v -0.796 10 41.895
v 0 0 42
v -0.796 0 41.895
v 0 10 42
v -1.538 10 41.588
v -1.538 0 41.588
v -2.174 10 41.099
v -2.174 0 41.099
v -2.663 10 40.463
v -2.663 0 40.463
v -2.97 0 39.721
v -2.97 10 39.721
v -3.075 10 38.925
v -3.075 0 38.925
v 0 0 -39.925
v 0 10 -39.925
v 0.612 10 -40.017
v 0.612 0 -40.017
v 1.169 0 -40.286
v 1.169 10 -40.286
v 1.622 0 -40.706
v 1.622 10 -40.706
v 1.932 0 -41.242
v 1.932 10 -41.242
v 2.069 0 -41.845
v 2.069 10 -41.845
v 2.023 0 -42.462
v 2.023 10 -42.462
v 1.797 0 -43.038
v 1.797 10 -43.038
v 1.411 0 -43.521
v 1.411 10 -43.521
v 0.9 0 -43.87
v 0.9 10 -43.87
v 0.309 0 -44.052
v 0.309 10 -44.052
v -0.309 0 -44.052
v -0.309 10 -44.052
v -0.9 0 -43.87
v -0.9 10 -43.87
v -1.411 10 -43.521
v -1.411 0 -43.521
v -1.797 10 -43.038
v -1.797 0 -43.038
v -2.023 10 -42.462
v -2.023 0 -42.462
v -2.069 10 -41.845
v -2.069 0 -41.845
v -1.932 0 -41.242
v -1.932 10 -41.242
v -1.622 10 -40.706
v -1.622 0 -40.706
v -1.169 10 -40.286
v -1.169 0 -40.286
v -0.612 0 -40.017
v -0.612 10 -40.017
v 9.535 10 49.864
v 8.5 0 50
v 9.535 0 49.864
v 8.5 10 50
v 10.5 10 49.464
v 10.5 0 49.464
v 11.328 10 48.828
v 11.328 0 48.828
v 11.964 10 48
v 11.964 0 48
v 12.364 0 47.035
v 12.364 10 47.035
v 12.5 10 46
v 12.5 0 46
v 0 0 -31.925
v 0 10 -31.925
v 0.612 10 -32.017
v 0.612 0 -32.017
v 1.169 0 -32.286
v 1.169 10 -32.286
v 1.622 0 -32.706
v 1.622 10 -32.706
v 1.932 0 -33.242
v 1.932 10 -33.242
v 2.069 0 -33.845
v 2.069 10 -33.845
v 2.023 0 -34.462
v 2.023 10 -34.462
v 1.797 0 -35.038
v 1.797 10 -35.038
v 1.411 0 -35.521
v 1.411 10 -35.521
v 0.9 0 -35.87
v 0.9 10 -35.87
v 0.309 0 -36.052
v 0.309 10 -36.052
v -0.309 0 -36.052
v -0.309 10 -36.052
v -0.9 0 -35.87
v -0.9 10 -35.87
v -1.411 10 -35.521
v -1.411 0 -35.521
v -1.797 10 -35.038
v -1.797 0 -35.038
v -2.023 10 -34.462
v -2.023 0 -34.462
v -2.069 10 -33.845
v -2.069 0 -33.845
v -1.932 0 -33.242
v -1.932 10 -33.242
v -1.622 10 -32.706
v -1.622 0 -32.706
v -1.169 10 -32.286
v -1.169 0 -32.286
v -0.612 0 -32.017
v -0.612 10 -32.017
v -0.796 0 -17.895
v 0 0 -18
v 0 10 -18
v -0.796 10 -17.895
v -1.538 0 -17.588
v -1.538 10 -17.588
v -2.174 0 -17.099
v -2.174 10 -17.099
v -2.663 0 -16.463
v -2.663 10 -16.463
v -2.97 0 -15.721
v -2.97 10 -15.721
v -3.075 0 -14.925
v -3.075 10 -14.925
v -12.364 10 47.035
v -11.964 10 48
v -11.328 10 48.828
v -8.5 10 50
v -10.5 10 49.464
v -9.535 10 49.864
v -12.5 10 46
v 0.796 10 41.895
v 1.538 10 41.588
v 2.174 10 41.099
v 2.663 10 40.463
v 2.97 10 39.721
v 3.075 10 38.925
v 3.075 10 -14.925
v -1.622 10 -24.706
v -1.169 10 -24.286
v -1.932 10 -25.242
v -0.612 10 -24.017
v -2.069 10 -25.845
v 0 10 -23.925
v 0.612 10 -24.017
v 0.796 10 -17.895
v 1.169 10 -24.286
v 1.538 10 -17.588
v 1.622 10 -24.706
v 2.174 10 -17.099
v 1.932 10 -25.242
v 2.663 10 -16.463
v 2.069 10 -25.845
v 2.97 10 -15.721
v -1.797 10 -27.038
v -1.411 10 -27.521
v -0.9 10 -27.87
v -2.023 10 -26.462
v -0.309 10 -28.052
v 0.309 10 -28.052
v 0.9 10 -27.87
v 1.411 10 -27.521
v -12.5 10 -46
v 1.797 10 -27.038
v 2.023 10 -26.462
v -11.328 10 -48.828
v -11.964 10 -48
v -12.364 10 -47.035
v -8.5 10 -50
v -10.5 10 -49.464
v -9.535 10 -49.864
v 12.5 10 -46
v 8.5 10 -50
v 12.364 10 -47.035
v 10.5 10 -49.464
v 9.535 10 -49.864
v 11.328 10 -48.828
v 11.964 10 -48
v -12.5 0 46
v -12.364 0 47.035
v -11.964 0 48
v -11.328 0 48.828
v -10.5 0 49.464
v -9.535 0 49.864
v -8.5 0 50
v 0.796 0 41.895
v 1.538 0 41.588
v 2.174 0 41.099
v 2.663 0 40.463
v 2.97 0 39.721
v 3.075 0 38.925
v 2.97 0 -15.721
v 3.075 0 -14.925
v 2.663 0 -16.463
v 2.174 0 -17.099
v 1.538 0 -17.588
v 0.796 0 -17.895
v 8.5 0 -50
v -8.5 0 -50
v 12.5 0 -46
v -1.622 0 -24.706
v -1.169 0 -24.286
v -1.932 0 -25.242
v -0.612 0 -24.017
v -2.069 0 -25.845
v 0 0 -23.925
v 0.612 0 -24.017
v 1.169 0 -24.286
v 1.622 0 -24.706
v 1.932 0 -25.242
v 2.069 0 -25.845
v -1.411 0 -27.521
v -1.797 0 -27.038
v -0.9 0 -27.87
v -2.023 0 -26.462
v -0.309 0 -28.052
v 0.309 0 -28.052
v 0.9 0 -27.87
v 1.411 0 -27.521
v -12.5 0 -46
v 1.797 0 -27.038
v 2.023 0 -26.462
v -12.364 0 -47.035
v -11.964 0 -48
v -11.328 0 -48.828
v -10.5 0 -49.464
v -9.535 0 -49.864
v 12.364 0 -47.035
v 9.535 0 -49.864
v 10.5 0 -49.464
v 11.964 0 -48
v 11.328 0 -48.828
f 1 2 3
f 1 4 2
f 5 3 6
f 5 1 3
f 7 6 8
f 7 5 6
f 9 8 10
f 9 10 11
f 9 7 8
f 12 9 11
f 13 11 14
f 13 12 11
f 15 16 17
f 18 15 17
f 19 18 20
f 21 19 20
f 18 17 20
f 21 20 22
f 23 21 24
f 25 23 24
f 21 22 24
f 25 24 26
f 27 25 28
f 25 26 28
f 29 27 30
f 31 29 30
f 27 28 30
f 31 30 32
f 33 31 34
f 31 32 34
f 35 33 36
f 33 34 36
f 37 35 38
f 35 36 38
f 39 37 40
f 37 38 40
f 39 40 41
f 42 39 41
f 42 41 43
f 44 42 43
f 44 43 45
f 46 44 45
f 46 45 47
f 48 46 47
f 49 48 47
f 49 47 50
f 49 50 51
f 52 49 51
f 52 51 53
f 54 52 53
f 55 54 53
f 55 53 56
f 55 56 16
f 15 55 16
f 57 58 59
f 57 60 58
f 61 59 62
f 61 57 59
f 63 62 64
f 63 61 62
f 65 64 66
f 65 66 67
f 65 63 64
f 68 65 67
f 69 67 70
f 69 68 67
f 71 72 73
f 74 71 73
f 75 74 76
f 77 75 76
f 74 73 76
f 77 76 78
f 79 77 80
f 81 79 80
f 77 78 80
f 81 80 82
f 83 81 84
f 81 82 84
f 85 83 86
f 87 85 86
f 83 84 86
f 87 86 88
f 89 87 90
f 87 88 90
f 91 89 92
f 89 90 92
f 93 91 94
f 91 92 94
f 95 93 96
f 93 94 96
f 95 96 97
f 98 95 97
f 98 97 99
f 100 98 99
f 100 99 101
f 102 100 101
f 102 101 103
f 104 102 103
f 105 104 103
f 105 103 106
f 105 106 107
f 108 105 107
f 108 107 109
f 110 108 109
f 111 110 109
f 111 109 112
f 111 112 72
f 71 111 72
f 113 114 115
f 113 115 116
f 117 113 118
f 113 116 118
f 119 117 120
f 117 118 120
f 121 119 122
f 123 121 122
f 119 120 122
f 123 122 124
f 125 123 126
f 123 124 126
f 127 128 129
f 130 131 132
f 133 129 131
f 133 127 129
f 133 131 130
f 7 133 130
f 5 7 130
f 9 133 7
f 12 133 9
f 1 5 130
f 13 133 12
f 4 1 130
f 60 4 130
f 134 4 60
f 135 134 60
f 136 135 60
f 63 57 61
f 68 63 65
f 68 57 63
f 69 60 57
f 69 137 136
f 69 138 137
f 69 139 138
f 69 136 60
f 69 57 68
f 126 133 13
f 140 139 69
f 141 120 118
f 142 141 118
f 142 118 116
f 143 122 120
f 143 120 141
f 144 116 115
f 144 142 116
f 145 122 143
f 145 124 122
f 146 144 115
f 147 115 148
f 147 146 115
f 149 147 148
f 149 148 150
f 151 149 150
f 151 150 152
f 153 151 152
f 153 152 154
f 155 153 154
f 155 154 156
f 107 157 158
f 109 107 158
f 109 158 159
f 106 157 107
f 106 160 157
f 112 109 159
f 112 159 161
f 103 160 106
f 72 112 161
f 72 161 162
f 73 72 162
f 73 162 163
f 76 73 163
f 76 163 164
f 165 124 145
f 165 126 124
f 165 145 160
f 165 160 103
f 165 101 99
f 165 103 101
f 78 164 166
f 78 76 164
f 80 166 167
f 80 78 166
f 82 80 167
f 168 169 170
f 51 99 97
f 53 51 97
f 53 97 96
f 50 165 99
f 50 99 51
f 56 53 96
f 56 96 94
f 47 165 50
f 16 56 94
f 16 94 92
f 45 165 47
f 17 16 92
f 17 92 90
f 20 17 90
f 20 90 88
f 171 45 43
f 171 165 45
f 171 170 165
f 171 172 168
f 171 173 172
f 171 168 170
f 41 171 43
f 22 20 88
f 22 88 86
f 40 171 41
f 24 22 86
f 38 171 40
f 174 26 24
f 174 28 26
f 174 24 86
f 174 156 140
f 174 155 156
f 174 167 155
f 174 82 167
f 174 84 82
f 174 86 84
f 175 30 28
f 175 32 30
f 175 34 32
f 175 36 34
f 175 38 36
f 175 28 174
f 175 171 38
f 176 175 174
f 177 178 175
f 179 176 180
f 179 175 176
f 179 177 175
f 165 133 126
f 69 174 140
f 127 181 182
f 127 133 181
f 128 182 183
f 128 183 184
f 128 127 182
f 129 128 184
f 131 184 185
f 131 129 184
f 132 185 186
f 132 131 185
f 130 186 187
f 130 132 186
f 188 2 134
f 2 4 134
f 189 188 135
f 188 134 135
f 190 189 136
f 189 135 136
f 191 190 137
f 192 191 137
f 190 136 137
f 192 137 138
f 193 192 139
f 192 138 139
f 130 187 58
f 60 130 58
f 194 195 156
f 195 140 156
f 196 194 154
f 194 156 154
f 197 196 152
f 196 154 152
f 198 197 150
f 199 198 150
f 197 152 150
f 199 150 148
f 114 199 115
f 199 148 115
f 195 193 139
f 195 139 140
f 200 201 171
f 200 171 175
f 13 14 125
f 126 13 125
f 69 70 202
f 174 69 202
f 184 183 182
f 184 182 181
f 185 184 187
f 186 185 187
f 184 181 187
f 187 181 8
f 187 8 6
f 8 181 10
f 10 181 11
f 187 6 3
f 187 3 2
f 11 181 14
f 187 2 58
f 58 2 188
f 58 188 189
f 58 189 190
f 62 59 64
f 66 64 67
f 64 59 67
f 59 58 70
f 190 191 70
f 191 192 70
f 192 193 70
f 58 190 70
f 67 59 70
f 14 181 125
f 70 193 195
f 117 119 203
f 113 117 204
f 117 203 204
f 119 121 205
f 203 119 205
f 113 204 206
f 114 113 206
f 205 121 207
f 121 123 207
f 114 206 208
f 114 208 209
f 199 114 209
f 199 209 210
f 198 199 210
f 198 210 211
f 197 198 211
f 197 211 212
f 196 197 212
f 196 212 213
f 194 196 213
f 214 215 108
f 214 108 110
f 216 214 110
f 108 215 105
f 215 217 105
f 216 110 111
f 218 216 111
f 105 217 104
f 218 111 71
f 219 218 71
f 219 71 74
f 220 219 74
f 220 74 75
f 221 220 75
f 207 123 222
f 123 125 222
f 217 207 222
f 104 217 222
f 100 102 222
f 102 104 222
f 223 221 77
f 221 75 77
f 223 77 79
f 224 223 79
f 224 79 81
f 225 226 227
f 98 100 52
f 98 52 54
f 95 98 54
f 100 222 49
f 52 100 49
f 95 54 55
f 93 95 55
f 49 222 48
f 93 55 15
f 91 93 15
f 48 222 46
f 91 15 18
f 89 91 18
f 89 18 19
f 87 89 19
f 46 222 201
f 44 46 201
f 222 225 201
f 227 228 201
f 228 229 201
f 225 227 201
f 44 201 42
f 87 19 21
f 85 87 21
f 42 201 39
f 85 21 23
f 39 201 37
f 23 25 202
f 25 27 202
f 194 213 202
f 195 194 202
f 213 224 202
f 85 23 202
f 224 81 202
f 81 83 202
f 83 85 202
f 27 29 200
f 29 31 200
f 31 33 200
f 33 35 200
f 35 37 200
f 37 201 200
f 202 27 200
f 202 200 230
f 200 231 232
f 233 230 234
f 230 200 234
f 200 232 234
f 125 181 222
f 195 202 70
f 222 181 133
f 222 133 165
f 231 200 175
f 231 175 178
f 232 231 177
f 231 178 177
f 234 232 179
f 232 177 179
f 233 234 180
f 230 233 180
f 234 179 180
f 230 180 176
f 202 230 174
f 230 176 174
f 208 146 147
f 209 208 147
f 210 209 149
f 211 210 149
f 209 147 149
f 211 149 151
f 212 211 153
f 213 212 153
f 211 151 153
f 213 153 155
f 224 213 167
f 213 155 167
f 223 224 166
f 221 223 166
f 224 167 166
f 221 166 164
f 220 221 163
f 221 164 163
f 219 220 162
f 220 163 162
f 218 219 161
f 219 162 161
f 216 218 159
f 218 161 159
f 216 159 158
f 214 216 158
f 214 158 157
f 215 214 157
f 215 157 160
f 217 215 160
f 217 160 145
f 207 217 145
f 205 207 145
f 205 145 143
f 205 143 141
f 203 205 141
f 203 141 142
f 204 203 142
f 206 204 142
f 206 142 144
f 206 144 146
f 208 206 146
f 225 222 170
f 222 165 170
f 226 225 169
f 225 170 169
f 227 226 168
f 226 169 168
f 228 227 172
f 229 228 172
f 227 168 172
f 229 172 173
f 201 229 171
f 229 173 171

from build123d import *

# Parameters (mm, degrees)
SKETCH1_W                    = 25
SKETCH1_H                    = 100
BOSS_EXTRUDE1_DEPTH          = 10
CUT_EXTRUDE_THIN2_DEPTH      = 53.5
CUT_EXTRUDE_THIN2_DEPTH_BACK = 10
SKETCH3_W                    = 6.15
SKETCH3_H                    = 60
FILLET2_R                    = 3.075
FILLET3_R                    = 4
SKETCH4_R                    = 2.075
CUT_EXTRUDE1_DEPTH           = 53.5
LPATTERN1_COUNT              = 3
LPATTERN1_PITCH              = 8


with BuildPart() as part:
    # Sketch1 → Boss-Extrude1 (new body)
    with BuildSketch(Plane(origin=(0, 0, 0), x_dir=(1, 0, 0), z_dir=(0, 1, 0))):
        Rectangle(SKETCH1_W, SKETCH1_H)
    extrude(amount=BOSS_EXTRUDE1_DEPTH)

    # Sketch3 → Cut-Extrude-Thin2 (cut, two sides: drawn at the far end of the back side and taken through both)
    with BuildSketch(Plane(origin=(0, 10, 0), x_dir=(1, 0, 0), z_dir=(0, 1, 0)).offset(-CUT_EXTRUDE_THIN2_DEPTH_BACK)):
        with Locations((0, -12)):
            Rectangle(SKETCH3_W, SKETCH3_H)
    extrude(amount=CUT_EXTRUDE_THIN2_DEPTH + CUT_EXTRUDE_THIN2_DEPTH_BACK, mode=Mode.SUBTRACT)

    # Fillet2
    fillet2_edges = [part.edges().sort_by_distance(p)[0] for p in [
        (3.075, 5, -18),
        (-3.075, 5, -18),
        (3.075, 5, 42),
        (-3.075, 5, 42),
    ]]
    fillet(fillet2_edges, radius=FILLET2_R - 0.0001)  # a hair under: the kernel refuses the full size

    # Fillet3
    fillet3_edges = [part.edges().sort_by_distance(p)[0] for p in [
        (12.5, 5, 50),
        (-12.5, 5, 50),
        (-12.5, 5, -50),
        (12.5, 5, -50),
    ]]
    fillet(fillet3_edges, radius=FILLET3_R)

    # Sketch4 → Cut-Extrude1 (cut, through all)
    with BuildSketch(Plane(origin=(0, 10, 0), x_dir=(1, 0, 0), z_dir=(0, 1, 0))):
        with Locations(Location((0, 42, 0), (0, 0, 270))):
            Circle(SKETCH4_R)
    cut_extrude1 = extrude(amount=-CUT_EXTRUDE1_DEPTH, mode=Mode.SUBTRACT)

    # LPattern1: Cut-Extrude1 ×3
    with Locations(*[(0, 0, i * LPATTERN1_PITCH) for i in range(1, LPATTERN1_COUNT)]):
        add(cut_extrude1, mode=Mode.SUBTRACT)


solid = part.part
